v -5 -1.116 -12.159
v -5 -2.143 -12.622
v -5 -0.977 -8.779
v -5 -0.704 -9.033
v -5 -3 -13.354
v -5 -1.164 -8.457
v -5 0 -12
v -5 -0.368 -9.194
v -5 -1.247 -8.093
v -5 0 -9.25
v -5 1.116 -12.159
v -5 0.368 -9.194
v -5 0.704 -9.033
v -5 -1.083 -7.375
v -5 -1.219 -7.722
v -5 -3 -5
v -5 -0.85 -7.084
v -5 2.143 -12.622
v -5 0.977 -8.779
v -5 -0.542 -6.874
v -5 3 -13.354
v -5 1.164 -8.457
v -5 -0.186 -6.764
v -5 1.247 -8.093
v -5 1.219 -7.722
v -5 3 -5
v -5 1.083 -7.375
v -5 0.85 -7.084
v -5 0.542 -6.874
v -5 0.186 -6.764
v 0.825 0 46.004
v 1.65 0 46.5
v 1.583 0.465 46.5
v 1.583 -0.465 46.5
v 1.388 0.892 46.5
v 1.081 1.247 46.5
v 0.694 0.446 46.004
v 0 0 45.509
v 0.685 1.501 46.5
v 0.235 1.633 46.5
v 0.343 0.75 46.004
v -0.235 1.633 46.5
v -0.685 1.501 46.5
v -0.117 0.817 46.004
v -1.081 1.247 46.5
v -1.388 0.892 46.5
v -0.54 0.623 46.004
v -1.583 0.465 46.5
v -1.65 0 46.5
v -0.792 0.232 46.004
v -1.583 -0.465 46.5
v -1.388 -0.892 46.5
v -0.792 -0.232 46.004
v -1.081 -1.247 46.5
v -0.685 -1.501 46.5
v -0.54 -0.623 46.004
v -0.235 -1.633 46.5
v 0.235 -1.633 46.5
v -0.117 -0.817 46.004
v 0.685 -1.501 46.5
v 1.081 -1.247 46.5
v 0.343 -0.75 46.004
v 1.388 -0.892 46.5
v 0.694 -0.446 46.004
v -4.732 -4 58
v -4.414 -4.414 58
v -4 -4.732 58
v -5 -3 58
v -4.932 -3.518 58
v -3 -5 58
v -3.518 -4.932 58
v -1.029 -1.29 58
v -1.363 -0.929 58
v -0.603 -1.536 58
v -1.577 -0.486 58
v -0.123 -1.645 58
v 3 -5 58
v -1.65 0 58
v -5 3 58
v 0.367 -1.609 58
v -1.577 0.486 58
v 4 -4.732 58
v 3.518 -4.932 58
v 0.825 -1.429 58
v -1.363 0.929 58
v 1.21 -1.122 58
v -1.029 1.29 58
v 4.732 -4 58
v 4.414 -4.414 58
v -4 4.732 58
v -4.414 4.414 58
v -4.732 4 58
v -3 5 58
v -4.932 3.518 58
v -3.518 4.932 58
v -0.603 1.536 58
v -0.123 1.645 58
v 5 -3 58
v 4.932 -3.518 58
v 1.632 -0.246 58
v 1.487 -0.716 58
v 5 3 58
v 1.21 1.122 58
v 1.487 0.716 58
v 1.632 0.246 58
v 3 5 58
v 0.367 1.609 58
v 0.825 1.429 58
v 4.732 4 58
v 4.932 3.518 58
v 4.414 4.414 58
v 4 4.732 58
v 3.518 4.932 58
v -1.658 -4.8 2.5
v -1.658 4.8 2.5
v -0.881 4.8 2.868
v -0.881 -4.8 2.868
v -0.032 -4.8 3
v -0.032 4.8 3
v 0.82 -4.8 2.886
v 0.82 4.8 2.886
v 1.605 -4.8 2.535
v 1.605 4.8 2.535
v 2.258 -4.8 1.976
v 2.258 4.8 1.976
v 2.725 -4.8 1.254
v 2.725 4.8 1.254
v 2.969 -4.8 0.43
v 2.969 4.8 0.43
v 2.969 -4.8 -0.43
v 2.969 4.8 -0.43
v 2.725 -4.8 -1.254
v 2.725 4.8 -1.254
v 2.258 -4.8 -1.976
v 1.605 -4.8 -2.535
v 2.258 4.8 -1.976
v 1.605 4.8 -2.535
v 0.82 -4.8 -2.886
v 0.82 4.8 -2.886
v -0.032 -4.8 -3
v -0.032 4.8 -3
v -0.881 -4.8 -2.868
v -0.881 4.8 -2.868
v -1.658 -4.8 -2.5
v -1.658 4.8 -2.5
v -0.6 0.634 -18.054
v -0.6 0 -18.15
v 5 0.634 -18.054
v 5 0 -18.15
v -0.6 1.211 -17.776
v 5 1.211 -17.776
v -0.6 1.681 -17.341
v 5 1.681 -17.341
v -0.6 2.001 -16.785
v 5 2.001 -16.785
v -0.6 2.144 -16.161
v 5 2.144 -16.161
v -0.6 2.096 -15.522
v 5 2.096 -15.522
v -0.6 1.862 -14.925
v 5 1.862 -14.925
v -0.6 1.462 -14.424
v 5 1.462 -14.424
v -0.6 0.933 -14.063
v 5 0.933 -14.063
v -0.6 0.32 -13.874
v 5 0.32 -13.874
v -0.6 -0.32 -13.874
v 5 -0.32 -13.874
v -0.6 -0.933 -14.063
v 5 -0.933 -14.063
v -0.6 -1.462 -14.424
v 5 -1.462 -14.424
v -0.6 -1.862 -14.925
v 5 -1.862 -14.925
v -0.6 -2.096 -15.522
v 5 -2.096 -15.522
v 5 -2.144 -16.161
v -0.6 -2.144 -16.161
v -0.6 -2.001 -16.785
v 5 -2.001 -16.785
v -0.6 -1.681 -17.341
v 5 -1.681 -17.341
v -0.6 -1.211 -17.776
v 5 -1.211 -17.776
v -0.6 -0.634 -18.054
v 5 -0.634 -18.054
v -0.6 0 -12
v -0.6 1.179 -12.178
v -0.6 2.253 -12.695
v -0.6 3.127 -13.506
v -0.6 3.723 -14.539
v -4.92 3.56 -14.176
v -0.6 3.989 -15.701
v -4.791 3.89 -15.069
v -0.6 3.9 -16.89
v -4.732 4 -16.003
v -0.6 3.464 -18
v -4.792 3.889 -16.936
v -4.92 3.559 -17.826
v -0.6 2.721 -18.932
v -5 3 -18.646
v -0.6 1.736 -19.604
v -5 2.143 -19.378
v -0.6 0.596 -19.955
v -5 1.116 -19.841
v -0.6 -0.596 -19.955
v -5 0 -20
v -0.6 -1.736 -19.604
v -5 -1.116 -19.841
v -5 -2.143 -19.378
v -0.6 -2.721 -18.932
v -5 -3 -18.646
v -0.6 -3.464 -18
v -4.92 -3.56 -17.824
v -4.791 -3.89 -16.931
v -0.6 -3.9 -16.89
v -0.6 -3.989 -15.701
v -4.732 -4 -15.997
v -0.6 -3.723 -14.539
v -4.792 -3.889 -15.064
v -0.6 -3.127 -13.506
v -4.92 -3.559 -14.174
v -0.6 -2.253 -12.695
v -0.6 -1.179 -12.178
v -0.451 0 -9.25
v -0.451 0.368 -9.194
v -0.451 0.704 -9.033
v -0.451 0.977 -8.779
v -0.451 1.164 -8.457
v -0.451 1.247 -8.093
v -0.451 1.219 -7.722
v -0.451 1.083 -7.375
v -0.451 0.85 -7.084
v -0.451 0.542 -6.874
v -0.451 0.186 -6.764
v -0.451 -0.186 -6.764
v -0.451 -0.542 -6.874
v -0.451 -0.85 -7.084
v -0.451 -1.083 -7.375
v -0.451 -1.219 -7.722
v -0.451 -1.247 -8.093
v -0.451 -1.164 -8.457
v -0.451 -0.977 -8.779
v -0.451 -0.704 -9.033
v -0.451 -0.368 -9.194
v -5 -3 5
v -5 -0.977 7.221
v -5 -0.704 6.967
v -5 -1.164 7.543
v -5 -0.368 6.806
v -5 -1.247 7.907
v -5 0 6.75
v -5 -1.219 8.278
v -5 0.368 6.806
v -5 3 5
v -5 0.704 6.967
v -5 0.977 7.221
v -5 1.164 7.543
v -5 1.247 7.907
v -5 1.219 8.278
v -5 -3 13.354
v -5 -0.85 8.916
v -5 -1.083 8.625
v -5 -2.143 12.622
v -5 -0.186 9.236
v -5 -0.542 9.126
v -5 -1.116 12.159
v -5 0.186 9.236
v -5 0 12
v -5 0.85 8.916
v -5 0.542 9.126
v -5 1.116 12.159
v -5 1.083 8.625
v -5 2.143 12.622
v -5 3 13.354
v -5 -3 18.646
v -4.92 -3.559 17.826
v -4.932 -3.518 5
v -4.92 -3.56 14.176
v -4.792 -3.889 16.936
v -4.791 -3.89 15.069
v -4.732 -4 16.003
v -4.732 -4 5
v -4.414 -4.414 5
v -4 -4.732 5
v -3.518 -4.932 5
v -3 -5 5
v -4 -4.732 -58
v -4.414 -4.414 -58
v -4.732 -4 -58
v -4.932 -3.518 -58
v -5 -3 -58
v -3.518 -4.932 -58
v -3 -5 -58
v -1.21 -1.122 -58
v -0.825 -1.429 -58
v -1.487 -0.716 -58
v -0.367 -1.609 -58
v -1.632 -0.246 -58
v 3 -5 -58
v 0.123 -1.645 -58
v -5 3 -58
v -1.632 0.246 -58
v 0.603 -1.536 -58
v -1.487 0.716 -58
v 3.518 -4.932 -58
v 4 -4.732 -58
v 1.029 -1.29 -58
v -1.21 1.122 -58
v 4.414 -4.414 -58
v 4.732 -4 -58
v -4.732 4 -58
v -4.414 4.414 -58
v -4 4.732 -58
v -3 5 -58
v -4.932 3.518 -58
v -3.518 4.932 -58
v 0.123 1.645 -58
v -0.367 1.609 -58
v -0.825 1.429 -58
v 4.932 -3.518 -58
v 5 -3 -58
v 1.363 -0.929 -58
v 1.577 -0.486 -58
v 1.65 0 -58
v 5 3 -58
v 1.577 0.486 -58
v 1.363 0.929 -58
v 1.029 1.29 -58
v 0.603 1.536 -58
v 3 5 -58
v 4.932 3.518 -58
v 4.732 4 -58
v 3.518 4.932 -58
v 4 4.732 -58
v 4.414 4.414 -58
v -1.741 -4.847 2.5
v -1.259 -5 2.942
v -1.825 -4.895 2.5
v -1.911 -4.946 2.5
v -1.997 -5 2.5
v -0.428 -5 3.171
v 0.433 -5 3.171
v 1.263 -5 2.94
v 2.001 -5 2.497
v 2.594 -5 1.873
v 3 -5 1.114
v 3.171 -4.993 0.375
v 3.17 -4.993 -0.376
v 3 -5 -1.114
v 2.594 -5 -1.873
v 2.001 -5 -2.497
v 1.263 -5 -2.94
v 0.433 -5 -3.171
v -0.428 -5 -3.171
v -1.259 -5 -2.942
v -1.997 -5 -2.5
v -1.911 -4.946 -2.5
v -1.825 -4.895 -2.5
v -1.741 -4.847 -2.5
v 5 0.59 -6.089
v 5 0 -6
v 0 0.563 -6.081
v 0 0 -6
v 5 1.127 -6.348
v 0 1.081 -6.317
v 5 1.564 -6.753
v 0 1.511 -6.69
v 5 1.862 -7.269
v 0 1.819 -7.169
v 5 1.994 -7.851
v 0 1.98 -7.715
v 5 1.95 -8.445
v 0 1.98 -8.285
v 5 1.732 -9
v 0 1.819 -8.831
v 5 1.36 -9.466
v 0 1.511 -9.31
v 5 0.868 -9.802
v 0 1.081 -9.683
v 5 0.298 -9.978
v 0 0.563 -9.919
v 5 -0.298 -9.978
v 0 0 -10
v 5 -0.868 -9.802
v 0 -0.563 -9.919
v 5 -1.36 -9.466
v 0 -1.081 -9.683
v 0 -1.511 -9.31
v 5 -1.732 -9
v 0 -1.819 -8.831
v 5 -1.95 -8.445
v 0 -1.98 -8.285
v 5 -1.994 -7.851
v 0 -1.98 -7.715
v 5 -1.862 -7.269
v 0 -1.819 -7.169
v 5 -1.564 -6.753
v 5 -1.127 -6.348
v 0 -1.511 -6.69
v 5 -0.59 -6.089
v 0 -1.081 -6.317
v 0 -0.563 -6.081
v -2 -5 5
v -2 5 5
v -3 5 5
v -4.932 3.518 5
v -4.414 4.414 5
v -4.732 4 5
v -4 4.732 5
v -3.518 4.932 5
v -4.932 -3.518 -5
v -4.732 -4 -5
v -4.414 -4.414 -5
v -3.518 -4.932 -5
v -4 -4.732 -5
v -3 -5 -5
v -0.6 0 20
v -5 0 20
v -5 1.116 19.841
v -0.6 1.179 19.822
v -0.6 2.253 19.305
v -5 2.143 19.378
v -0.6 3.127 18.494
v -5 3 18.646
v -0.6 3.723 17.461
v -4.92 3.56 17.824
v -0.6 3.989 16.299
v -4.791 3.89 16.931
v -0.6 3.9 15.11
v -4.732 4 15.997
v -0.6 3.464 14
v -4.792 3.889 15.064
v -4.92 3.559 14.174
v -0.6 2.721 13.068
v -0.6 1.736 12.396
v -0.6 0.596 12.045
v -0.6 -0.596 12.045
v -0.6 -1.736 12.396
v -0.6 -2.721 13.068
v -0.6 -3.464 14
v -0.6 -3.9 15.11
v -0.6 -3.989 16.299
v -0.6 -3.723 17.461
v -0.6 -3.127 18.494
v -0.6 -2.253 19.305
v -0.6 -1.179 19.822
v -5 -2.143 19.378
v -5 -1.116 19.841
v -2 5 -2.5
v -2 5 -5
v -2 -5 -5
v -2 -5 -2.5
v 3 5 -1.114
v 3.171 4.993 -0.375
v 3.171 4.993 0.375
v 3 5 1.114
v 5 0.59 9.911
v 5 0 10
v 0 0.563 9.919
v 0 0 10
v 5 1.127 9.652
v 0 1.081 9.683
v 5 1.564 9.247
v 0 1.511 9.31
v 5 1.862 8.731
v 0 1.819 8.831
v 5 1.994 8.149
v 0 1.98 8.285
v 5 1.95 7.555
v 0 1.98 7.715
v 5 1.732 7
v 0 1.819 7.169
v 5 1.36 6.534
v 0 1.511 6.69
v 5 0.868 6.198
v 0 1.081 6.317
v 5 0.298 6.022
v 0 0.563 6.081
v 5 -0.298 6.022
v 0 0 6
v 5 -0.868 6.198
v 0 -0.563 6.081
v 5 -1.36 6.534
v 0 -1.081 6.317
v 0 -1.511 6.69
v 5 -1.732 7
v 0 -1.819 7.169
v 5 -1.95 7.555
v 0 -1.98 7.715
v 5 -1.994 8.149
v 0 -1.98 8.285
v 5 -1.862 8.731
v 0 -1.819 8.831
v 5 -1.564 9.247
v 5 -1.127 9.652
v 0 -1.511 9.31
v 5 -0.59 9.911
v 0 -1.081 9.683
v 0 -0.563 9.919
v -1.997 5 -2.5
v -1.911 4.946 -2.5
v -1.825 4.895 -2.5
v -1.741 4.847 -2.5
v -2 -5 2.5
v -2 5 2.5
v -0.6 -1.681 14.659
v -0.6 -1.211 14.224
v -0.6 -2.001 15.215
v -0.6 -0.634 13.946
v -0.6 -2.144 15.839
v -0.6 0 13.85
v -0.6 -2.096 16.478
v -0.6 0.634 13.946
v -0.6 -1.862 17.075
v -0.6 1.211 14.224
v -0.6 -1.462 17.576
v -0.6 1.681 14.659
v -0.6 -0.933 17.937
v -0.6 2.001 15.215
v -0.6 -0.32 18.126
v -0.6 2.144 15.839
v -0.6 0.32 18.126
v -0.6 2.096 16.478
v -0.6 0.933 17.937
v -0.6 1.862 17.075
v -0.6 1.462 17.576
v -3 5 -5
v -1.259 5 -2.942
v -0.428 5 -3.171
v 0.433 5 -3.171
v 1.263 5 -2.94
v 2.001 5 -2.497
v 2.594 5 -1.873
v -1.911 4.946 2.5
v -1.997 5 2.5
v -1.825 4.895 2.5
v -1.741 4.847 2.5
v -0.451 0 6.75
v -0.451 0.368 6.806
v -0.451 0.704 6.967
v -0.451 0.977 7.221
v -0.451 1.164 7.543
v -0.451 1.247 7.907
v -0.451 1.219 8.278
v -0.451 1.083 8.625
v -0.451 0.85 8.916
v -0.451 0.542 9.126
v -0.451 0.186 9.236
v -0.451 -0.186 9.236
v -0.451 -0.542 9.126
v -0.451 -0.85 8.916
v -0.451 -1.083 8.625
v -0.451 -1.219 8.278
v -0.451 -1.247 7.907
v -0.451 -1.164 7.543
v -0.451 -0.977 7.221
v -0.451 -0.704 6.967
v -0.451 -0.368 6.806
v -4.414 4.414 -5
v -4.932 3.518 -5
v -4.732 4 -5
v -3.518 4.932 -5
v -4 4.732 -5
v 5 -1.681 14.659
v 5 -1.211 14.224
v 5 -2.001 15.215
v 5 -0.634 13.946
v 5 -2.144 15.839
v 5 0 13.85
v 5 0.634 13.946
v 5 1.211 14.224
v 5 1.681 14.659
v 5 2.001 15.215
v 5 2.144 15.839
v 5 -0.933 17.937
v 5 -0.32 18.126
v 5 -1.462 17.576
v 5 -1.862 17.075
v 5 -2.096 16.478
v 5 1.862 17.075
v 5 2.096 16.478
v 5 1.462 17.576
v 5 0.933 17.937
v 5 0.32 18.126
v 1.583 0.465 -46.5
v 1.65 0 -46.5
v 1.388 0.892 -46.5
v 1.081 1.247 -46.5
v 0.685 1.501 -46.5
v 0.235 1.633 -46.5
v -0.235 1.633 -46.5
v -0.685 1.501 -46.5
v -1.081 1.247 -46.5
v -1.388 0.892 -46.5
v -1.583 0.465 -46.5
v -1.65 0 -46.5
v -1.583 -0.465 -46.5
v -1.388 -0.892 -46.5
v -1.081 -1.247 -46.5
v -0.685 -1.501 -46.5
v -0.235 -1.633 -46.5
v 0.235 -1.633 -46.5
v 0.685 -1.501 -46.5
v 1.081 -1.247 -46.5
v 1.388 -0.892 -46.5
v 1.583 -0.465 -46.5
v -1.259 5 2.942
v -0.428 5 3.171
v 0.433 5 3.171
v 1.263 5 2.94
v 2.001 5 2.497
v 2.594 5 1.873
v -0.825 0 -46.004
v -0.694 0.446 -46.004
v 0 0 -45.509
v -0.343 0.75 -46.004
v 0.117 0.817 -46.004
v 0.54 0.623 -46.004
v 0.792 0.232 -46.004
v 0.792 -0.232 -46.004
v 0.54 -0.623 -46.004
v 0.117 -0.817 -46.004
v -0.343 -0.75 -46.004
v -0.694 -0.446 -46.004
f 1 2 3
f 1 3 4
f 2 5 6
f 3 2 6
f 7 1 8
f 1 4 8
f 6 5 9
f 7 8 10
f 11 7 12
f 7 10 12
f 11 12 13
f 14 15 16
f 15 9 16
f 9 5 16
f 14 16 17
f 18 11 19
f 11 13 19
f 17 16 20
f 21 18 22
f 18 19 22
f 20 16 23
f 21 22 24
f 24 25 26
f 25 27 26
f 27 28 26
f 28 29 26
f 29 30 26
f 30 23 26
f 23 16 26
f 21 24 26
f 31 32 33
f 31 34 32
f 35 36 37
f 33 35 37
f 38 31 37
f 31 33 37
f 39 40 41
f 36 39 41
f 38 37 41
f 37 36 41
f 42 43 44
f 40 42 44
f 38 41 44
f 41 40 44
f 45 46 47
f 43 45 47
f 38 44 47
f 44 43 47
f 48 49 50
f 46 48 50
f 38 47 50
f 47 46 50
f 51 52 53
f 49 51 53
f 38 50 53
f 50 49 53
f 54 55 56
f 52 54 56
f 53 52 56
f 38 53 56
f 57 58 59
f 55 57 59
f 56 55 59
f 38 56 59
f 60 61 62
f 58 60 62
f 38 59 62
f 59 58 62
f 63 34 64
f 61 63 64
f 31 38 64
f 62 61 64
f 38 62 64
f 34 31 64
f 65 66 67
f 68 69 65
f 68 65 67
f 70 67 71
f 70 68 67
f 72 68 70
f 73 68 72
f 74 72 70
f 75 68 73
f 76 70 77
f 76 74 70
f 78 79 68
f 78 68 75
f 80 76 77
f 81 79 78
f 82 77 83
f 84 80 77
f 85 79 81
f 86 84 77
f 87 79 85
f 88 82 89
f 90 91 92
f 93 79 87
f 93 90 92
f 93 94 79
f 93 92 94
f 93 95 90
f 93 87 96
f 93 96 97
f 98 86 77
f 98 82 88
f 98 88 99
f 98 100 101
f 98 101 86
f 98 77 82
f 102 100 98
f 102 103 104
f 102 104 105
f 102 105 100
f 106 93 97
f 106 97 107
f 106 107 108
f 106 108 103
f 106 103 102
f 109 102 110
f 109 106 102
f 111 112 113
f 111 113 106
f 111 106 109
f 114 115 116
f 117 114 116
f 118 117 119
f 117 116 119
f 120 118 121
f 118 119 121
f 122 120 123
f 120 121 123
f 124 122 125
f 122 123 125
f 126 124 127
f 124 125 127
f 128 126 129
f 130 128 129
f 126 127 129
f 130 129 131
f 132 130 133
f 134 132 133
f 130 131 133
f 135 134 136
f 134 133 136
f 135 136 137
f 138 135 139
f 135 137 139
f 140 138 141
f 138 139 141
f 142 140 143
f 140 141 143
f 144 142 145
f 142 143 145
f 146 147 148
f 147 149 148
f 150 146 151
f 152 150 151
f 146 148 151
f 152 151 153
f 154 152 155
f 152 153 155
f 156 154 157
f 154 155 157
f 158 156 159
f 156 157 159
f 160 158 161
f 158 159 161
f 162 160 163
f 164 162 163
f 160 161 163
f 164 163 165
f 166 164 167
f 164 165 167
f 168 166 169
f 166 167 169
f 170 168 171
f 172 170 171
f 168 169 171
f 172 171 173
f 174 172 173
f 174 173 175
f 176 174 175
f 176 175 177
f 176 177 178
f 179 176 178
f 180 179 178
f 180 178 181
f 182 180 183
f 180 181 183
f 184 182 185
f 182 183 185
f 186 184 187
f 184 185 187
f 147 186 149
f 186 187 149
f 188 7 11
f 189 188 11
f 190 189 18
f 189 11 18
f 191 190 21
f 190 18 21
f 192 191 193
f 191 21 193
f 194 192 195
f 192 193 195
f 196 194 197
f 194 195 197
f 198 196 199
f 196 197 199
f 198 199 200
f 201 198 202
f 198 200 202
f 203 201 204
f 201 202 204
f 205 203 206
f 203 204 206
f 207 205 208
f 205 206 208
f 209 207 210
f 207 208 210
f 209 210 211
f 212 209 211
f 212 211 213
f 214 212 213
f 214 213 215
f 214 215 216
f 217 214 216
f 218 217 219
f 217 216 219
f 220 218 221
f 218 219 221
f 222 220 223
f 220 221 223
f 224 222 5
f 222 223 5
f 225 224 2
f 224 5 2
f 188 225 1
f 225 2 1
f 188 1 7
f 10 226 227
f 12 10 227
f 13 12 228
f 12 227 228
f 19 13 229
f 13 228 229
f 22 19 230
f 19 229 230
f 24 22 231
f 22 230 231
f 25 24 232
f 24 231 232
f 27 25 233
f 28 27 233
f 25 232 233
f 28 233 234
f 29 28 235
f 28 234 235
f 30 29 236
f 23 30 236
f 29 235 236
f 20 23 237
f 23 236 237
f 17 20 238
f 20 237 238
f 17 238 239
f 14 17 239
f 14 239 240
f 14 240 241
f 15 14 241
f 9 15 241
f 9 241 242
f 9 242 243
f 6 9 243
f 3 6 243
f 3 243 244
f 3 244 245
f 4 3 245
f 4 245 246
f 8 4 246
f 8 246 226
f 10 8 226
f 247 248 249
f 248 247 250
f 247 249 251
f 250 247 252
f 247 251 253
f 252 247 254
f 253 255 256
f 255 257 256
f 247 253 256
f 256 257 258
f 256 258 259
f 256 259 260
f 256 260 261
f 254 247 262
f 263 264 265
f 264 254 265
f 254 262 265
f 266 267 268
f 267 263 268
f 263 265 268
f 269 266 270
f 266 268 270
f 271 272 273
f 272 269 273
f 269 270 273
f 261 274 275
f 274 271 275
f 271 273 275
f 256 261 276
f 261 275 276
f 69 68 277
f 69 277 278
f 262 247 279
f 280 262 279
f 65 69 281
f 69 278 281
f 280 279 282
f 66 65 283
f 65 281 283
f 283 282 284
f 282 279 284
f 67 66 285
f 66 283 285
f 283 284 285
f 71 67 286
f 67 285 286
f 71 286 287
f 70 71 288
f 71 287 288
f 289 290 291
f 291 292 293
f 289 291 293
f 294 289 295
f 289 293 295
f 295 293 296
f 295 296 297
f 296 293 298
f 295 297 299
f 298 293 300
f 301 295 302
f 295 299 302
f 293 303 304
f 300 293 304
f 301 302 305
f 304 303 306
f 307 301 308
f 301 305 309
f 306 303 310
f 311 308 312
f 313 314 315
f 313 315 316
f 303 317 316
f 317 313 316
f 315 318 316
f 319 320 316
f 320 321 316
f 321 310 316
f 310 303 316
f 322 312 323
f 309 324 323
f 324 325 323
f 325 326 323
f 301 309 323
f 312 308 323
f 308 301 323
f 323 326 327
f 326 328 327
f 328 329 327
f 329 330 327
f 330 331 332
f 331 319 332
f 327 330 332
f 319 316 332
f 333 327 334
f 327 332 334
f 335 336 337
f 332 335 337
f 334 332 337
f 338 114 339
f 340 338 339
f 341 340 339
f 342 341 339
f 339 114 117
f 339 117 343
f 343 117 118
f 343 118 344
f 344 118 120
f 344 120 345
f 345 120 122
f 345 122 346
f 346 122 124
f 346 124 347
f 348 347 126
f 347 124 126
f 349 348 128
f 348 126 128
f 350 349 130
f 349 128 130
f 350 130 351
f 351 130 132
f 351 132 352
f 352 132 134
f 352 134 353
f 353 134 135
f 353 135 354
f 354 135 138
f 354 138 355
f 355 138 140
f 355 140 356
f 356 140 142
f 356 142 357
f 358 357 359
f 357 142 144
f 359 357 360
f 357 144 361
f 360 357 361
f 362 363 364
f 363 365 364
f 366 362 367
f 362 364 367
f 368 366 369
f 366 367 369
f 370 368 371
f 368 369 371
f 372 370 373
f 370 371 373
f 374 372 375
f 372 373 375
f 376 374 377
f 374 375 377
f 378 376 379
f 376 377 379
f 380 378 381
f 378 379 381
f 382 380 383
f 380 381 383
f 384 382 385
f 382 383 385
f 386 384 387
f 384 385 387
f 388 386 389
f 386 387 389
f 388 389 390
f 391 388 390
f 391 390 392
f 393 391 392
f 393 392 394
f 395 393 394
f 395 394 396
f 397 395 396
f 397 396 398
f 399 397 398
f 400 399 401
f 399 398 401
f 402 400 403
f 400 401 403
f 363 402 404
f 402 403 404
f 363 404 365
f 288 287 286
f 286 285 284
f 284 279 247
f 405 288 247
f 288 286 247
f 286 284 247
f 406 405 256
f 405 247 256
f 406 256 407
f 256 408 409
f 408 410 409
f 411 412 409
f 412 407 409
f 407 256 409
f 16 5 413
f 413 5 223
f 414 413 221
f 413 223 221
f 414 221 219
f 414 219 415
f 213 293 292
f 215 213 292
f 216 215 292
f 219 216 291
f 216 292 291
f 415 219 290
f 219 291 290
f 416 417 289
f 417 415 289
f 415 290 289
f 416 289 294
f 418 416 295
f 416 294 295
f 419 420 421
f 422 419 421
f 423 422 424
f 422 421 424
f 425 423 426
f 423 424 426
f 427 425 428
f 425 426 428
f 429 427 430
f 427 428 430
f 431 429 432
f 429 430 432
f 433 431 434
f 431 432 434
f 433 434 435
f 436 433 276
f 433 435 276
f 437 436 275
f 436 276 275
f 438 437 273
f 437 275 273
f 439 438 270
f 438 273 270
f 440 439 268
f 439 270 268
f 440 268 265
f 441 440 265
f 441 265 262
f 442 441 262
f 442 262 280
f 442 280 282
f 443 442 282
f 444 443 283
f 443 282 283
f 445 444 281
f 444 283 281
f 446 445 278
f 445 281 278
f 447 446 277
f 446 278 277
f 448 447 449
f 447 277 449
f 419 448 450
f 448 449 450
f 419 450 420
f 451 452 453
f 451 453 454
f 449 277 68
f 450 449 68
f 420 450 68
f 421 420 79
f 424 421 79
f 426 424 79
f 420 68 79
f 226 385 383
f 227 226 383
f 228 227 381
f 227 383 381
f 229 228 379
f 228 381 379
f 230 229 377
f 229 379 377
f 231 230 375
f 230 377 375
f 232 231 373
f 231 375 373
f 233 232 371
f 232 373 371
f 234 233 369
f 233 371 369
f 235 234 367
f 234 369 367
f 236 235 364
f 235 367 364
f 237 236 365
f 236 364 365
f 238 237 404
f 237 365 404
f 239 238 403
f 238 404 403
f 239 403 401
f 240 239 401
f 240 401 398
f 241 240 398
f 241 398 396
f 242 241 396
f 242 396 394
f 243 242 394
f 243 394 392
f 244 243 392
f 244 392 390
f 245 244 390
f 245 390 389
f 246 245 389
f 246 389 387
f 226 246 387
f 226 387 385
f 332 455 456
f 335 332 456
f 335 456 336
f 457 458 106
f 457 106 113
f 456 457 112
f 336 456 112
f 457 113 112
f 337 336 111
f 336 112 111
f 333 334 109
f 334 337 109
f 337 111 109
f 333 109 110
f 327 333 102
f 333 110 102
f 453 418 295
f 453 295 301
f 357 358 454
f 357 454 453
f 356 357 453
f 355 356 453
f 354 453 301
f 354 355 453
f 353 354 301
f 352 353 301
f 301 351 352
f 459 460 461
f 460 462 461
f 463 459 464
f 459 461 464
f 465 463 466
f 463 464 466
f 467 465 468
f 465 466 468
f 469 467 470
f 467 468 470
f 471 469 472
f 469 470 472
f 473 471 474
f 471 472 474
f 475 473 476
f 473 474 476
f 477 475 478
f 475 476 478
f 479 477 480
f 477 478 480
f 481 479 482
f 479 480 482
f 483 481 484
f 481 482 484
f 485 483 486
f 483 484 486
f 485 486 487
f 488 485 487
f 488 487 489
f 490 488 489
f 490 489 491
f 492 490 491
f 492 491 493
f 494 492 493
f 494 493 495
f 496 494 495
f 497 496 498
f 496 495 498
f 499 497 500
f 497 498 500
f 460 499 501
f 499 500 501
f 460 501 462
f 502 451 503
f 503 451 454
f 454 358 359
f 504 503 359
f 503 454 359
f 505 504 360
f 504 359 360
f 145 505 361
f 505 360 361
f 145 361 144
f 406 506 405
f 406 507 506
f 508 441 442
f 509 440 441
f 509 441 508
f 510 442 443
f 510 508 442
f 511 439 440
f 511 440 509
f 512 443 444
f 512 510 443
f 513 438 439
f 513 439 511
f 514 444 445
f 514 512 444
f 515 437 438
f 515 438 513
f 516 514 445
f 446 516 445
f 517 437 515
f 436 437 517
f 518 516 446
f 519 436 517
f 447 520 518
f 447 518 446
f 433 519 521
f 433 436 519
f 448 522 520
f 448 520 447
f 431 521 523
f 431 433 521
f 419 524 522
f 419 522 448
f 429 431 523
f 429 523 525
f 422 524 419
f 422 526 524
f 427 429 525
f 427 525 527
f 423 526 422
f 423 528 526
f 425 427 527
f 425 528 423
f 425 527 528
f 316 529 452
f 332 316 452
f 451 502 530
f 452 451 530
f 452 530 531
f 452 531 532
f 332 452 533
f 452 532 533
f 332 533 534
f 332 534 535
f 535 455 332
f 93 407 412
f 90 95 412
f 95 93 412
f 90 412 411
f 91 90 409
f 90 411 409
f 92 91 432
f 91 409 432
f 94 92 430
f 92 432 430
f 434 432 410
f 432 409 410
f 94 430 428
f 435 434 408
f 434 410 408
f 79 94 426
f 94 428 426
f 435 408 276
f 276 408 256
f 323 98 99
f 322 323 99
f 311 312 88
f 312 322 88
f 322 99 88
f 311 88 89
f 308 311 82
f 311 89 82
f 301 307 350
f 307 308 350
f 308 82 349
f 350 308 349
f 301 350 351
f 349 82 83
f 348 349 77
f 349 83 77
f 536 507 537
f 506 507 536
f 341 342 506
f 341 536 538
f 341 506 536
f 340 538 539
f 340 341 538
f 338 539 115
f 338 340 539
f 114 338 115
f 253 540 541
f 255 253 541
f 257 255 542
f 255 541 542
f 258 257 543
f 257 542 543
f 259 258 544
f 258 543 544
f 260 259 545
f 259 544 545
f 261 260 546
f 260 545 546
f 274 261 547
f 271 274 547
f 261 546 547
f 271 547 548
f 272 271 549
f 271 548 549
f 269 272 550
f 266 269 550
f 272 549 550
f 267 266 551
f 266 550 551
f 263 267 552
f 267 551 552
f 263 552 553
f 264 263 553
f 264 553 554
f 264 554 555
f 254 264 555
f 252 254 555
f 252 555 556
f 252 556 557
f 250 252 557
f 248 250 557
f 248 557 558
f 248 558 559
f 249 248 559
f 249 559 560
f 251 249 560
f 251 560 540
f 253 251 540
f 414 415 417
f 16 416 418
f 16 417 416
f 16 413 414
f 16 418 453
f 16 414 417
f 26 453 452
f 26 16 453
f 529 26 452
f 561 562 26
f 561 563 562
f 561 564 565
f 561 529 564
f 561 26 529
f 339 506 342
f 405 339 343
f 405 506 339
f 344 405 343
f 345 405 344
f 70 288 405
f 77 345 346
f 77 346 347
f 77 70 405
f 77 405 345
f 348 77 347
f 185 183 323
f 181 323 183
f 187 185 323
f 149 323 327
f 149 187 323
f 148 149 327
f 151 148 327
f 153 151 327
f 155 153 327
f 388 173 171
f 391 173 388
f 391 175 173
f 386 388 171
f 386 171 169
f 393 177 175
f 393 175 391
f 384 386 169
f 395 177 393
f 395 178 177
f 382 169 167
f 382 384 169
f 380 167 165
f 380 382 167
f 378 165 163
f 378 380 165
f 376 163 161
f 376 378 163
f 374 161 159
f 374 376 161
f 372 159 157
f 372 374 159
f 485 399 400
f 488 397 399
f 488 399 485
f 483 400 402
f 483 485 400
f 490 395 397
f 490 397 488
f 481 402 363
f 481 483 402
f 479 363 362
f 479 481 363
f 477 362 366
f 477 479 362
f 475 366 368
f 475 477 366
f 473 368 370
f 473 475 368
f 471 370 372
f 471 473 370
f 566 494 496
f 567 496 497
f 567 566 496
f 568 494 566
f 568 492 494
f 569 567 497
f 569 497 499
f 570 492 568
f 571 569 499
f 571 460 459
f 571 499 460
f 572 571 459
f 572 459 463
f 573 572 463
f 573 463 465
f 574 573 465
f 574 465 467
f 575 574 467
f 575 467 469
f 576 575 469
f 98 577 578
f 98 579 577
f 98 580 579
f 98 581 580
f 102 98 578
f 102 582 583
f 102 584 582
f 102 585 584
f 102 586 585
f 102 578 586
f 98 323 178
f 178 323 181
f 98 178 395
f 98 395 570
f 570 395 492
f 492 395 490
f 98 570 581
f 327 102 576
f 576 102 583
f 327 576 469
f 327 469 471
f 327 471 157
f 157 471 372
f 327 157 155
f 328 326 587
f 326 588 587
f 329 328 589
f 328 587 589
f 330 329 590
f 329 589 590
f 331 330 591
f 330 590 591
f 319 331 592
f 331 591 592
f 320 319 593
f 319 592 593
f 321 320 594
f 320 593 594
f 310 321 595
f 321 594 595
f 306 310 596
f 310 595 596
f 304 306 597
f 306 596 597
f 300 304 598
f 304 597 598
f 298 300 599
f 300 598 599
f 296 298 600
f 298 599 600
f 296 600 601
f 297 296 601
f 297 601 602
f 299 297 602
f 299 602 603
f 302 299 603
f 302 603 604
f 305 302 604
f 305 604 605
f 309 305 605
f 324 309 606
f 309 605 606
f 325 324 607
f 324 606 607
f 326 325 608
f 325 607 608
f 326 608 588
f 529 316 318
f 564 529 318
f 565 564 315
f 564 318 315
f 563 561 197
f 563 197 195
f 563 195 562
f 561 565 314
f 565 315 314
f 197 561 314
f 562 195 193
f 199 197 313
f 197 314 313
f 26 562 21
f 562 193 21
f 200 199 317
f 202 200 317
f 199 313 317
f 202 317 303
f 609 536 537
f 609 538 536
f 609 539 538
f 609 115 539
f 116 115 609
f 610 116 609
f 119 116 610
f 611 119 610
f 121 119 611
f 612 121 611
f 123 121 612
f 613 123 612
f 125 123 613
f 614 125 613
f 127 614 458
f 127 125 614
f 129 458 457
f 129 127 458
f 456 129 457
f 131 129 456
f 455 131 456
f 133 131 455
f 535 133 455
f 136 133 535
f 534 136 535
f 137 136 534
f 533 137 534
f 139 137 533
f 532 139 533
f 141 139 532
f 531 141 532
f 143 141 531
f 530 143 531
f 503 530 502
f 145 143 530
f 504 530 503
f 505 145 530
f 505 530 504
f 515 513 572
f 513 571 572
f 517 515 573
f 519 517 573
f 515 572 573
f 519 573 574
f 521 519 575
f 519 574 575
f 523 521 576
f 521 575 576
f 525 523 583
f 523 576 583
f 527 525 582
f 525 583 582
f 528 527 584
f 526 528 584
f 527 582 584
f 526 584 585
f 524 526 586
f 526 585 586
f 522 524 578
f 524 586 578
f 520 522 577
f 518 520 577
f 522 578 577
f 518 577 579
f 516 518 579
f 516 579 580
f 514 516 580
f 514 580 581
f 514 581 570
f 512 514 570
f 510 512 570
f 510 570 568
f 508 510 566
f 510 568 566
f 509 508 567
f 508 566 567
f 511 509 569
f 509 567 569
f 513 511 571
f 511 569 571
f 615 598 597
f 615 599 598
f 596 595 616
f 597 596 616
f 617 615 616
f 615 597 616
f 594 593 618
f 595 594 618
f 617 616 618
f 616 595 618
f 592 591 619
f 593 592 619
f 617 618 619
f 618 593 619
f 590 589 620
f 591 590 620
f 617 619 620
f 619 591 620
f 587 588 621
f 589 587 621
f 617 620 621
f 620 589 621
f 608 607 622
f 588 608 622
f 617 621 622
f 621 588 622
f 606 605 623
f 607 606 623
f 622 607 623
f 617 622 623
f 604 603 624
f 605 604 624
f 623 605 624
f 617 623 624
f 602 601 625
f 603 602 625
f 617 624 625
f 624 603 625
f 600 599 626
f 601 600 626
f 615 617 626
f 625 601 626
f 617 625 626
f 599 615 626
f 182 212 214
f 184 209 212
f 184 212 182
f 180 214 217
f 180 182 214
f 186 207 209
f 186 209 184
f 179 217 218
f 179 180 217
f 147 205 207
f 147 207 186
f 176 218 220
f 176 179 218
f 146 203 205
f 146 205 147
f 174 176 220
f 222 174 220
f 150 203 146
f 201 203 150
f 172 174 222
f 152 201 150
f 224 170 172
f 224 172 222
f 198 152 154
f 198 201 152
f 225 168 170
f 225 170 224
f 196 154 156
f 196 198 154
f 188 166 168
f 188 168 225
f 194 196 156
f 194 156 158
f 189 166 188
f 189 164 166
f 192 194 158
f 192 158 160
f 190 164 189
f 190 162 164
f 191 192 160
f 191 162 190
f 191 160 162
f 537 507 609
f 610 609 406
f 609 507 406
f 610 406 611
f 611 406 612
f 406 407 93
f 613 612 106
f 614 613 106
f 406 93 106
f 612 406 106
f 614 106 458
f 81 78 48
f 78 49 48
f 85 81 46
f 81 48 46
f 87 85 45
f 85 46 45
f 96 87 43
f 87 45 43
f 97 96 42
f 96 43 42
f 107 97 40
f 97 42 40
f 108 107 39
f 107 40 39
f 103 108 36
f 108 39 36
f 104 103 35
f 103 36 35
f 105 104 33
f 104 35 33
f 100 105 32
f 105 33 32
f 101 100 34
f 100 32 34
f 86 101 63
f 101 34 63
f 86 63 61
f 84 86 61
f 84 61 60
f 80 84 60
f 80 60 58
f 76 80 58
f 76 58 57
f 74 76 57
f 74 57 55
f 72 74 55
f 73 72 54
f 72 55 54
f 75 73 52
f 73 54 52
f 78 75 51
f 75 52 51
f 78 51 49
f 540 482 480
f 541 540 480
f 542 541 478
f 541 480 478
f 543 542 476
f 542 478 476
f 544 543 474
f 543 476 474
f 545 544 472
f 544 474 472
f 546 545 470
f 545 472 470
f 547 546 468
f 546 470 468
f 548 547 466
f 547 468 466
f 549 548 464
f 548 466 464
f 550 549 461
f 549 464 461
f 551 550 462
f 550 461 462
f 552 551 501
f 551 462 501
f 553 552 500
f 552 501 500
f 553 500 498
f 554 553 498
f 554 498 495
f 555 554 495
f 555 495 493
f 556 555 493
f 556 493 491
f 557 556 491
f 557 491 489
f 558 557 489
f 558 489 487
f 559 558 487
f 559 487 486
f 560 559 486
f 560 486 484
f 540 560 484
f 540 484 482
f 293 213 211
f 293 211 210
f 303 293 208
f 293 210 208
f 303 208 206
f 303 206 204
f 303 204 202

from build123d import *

# Parameters (mm, degrees)
ESQUISSE1_W                                        = 10
ESQUISSE1_H                                        = 10
BOSS_EXTRU_1_DEPTH                                 = 58
ENL_V_MAT_EXTRU_2_REACH                            = 61.068
ESQUISSE12_R                                       = 3
CHANFREIN1_SIZE                                    = 0.2
CONG_1_R                                           = 2
TROU_TARAUD_M41_D                                  = 3.3
TROU_TARAUD_M41_DEPTH                              = 11.5
TROU_TARAUD_M41_TIP                                = 0.991420021
TROU_TARAUD_M42_D                                  = 3.3
TROU_TARAUD_M42_DEPTH                              = 11.5
TROU_TARAUD_M42_TIP                                = 0.991420021
DIAM_TRE_DU_PER_AGE_4_0_4_1_D                      = 4
DIAM_TRE_DU_PER_AGE_4_0_4_1_DEPTH                  = 5
DIAM_TRE_DU_PER_AGE_4_0_4_1_TIP                    = 1.201721238
CHAMBRAGE_POUR_VIS_T_TE_HEXAGONALE_M41_D           = 4.3
CHAMBRAGE_POUR_VIS_T_TE_HEXAGONALE_M41_CBORE_D     = 8
CHAMBRAGE_POUR_VIS_T_TE_HEXAGONALE_M41_CBORE_DEPTH = 4.4
TROU_TARAUD_M31_D                                  = 2.5
TROU_TARAUD_M31_DEPTH                              = 8.5
TROU_TARAUD_M31_TIP                                = 0.751075774
ESQUISSE25_W                                       = 10
ESQUISSE25_H                                       = 20
ENL_V_MAT_EXTRU_4_DEPTH                            = 3
CASSER_START                                       = -10
ESQUISSE26_W                                       = 5
ESQUISSE26_H                                       = 5
CASSER_ANGLE_DEPTH                                 = 10


with BuildPart() as part:
    # Esquisse1 → Boss.-Extru.1 (new, symmetric)
    with BuildSketch(Plane.XY):
        Rectangle(ESQUISSE1_W, ESQUISSE1_H)
    extrude(amount=BOSS_EXTRU_1_DEPTH, both=True)

    # Esquisse12 → Enlèv. mat.-Extru.2 (cut, up to next)
    with BuildSketch(Plane(origin=(0, 5, 0), x_dir=(1, 0, 0), z_dir=(0, 1, 0)), mode=Mode.PRIVATE) as enl_v_mat_extru_2_sk1:
        with Locations(Location((0, 0, 0), (0, 0, 180))):
            Circle(ESQUISSE12_R)
    enl_v_mat_extru_2_tool1 = extrude(enl_v_mat_extru_2_sk1.sketch, amount=-ENL_V_MAT_EXTRU_2_REACH, mode=Mode.PRIVATE) & part.part
    add(enl_v_mat_extru_2_tool1.solids().sort_by_distance((0, 5, 0))[0], mode=Mode.SUBTRACT)

    # Chanfrein1
    chanfrein1_edges = [part.edges().sort_by_distance(p)[0] for p in [
        (3, 5, 0),
        (3, -5, 0),
    ]]
    chamfer(chanfrein1_edges, length=CHANFREIN1_SIZE)

    # Congé1
    # the kernel refuses this fillet: 2 mm, written as the material it takes off along each edge
    with BuildSketch(Plane(origin=(-5, 5, -63), x_dir=(1, 0, 0), z_dir=(0, 0, 1)), Plane(origin=(5, 5, 63), x_dir=(-1, 0, 0), z_dir=(0, 0, -1)), Plane(origin=(5, -5, 63), x_dir=(0, 1, 0), z_dir=(0, 0, -1)), Plane(origin=(-5, -5, -63), x_dir=(0, 1, 0), z_dir=(0, 0, 1))) as cong_1_piece_1:
        with BuildLine():
            CenterArc((CONG_1_R, -CONG_1_R), CONG_1_R, 90, 90)
            Line((0, -CONG_1_R), (0, 0))
            Line((0, 0), (CONG_1_R, 0))
        make_face()
    extrude(amount=126, mode=Mode.SUBTRACT)

    # Trou taraudé M41
    with Locations(Plane.XY.offset(58)):
        with Locations((0, 0)):
            Hole(TROU_TARAUD_M41_D / 2, depth=TROU_TARAUD_M41_DEPTH)
            with Locations((0, 0, -(TROU_TARAUD_M41_DEPTH + TROU_TARAUD_M41_TIP / 2))):  # 118° drill point
                Cone(0, TROU_TARAUD_M41_D / 2, TROU_TARAUD_M41_TIP, mode=Mode.SUBTRACT)

    # Trou taraudé M42
    with Locations(Plane(origin=(0, 0, -58), x_dir=(-1, 0, 0), z_dir=(0, 0, -1))):
        with Locations((0, 0)):
            Hole(TROU_TARAUD_M42_D / 2, depth=TROU_TARAUD_M42_DEPTH)
            with Locations((0, 0, -(TROU_TARAUD_M42_DEPTH + TROU_TARAUD_M42_TIP / 2))):  # 118° drill point
                Cone(0, TROU_TARAUD_M42_D / 2, TROU_TARAUD_M42_TIP, mode=Mode.SUBTRACT)

    # Diamètre du perçage Ø4.0 (4)1
    with Locations(Plane(origin=(5, 0, 0), x_dir=(0, 0, -1), z_dir=(1, 0, 0))):
        with Locations((8, 0), (-8, 0)):
            Hole(DIAM_TRE_DU_PER_AGE_4_0_4_1_D / 2, depth=DIAM_TRE_DU_PER_AGE_4_0_4_1_DEPTH)
            with Locations((0, 0, -(DIAM_TRE_DU_PER_AGE_4_0_4_1_DEPTH + DIAM_TRE_DU_PER_AGE_4_0_4_1_TIP / 2))):  # 118° drill point
                Cone(0, DIAM_TRE_DU_PER_AGE_4_0_4_1_D / 2, DIAM_TRE_DU_PER_AGE_4_0_4_1_TIP, mode=Mode.SUBTRACT)

    # Chambrage pour vis à tête hexagonale M41 (through all)
    with Locations(Plane.ZY.offset(5)):
        with Locations((-16, 0), (16, 0)):
            CounterBoreHole(CHAMBRAGE_POUR_VIS_T_TE_HEXAGONALE_M41_D / 2, CHAMBRAGE_POUR_VIS_T_TE_HEXAGONALE_M41_CBORE_D / 2, CHAMBRAGE_POUR_VIS_T_TE_HEXAGONALE_M41_CBORE_DEPTH)

    # Trou taraudé M31
    with Locations(Plane.ZY.offset(5)):
        with Locations((-8, 0), (8, 0)):
            Hole(TROU_TARAUD_M31_D / 2, depth=TROU_TARAUD_M31_DEPTH)
            with Locations((0, 0, -(TROU_TARAUD_M31_DEPTH + TROU_TARAUD_M31_TIP / 2))):  # 118° drill point
                Cone(0, TROU_TARAUD_M31_D / 2, TROU_TARAUD_M31_TIP, mode=Mode.SUBTRACT)

    # Esquisse25 → Enlèv. mat.-Extru.4 (cut)
    with BuildSketch(Plane.ZY.offset(5)):
        Rectangle(ESQUISSE25_W, ESQUISSE25_H)
    extrude(amount=-ENL_V_MAT_EXTRU_4_DEPTH, mode=Mode.SUBTRACT)

    # Esquisse26 → Casser Angle (cut)
    with BuildSketch(Plane(origin=(0, 5, 0), x_dir=(1, 0, 0), z_dir=(0, 1, 0)).offset(CASSER_START)):
        with Locations((-2.5, 0)):
            Rectangle(ESQUISSE26_W, ESQUISSE26_H)
    extrude(amount=CASSER_ANGLE_DEPTH, mode=Mode.SUBTRACT)


solid = part.part
